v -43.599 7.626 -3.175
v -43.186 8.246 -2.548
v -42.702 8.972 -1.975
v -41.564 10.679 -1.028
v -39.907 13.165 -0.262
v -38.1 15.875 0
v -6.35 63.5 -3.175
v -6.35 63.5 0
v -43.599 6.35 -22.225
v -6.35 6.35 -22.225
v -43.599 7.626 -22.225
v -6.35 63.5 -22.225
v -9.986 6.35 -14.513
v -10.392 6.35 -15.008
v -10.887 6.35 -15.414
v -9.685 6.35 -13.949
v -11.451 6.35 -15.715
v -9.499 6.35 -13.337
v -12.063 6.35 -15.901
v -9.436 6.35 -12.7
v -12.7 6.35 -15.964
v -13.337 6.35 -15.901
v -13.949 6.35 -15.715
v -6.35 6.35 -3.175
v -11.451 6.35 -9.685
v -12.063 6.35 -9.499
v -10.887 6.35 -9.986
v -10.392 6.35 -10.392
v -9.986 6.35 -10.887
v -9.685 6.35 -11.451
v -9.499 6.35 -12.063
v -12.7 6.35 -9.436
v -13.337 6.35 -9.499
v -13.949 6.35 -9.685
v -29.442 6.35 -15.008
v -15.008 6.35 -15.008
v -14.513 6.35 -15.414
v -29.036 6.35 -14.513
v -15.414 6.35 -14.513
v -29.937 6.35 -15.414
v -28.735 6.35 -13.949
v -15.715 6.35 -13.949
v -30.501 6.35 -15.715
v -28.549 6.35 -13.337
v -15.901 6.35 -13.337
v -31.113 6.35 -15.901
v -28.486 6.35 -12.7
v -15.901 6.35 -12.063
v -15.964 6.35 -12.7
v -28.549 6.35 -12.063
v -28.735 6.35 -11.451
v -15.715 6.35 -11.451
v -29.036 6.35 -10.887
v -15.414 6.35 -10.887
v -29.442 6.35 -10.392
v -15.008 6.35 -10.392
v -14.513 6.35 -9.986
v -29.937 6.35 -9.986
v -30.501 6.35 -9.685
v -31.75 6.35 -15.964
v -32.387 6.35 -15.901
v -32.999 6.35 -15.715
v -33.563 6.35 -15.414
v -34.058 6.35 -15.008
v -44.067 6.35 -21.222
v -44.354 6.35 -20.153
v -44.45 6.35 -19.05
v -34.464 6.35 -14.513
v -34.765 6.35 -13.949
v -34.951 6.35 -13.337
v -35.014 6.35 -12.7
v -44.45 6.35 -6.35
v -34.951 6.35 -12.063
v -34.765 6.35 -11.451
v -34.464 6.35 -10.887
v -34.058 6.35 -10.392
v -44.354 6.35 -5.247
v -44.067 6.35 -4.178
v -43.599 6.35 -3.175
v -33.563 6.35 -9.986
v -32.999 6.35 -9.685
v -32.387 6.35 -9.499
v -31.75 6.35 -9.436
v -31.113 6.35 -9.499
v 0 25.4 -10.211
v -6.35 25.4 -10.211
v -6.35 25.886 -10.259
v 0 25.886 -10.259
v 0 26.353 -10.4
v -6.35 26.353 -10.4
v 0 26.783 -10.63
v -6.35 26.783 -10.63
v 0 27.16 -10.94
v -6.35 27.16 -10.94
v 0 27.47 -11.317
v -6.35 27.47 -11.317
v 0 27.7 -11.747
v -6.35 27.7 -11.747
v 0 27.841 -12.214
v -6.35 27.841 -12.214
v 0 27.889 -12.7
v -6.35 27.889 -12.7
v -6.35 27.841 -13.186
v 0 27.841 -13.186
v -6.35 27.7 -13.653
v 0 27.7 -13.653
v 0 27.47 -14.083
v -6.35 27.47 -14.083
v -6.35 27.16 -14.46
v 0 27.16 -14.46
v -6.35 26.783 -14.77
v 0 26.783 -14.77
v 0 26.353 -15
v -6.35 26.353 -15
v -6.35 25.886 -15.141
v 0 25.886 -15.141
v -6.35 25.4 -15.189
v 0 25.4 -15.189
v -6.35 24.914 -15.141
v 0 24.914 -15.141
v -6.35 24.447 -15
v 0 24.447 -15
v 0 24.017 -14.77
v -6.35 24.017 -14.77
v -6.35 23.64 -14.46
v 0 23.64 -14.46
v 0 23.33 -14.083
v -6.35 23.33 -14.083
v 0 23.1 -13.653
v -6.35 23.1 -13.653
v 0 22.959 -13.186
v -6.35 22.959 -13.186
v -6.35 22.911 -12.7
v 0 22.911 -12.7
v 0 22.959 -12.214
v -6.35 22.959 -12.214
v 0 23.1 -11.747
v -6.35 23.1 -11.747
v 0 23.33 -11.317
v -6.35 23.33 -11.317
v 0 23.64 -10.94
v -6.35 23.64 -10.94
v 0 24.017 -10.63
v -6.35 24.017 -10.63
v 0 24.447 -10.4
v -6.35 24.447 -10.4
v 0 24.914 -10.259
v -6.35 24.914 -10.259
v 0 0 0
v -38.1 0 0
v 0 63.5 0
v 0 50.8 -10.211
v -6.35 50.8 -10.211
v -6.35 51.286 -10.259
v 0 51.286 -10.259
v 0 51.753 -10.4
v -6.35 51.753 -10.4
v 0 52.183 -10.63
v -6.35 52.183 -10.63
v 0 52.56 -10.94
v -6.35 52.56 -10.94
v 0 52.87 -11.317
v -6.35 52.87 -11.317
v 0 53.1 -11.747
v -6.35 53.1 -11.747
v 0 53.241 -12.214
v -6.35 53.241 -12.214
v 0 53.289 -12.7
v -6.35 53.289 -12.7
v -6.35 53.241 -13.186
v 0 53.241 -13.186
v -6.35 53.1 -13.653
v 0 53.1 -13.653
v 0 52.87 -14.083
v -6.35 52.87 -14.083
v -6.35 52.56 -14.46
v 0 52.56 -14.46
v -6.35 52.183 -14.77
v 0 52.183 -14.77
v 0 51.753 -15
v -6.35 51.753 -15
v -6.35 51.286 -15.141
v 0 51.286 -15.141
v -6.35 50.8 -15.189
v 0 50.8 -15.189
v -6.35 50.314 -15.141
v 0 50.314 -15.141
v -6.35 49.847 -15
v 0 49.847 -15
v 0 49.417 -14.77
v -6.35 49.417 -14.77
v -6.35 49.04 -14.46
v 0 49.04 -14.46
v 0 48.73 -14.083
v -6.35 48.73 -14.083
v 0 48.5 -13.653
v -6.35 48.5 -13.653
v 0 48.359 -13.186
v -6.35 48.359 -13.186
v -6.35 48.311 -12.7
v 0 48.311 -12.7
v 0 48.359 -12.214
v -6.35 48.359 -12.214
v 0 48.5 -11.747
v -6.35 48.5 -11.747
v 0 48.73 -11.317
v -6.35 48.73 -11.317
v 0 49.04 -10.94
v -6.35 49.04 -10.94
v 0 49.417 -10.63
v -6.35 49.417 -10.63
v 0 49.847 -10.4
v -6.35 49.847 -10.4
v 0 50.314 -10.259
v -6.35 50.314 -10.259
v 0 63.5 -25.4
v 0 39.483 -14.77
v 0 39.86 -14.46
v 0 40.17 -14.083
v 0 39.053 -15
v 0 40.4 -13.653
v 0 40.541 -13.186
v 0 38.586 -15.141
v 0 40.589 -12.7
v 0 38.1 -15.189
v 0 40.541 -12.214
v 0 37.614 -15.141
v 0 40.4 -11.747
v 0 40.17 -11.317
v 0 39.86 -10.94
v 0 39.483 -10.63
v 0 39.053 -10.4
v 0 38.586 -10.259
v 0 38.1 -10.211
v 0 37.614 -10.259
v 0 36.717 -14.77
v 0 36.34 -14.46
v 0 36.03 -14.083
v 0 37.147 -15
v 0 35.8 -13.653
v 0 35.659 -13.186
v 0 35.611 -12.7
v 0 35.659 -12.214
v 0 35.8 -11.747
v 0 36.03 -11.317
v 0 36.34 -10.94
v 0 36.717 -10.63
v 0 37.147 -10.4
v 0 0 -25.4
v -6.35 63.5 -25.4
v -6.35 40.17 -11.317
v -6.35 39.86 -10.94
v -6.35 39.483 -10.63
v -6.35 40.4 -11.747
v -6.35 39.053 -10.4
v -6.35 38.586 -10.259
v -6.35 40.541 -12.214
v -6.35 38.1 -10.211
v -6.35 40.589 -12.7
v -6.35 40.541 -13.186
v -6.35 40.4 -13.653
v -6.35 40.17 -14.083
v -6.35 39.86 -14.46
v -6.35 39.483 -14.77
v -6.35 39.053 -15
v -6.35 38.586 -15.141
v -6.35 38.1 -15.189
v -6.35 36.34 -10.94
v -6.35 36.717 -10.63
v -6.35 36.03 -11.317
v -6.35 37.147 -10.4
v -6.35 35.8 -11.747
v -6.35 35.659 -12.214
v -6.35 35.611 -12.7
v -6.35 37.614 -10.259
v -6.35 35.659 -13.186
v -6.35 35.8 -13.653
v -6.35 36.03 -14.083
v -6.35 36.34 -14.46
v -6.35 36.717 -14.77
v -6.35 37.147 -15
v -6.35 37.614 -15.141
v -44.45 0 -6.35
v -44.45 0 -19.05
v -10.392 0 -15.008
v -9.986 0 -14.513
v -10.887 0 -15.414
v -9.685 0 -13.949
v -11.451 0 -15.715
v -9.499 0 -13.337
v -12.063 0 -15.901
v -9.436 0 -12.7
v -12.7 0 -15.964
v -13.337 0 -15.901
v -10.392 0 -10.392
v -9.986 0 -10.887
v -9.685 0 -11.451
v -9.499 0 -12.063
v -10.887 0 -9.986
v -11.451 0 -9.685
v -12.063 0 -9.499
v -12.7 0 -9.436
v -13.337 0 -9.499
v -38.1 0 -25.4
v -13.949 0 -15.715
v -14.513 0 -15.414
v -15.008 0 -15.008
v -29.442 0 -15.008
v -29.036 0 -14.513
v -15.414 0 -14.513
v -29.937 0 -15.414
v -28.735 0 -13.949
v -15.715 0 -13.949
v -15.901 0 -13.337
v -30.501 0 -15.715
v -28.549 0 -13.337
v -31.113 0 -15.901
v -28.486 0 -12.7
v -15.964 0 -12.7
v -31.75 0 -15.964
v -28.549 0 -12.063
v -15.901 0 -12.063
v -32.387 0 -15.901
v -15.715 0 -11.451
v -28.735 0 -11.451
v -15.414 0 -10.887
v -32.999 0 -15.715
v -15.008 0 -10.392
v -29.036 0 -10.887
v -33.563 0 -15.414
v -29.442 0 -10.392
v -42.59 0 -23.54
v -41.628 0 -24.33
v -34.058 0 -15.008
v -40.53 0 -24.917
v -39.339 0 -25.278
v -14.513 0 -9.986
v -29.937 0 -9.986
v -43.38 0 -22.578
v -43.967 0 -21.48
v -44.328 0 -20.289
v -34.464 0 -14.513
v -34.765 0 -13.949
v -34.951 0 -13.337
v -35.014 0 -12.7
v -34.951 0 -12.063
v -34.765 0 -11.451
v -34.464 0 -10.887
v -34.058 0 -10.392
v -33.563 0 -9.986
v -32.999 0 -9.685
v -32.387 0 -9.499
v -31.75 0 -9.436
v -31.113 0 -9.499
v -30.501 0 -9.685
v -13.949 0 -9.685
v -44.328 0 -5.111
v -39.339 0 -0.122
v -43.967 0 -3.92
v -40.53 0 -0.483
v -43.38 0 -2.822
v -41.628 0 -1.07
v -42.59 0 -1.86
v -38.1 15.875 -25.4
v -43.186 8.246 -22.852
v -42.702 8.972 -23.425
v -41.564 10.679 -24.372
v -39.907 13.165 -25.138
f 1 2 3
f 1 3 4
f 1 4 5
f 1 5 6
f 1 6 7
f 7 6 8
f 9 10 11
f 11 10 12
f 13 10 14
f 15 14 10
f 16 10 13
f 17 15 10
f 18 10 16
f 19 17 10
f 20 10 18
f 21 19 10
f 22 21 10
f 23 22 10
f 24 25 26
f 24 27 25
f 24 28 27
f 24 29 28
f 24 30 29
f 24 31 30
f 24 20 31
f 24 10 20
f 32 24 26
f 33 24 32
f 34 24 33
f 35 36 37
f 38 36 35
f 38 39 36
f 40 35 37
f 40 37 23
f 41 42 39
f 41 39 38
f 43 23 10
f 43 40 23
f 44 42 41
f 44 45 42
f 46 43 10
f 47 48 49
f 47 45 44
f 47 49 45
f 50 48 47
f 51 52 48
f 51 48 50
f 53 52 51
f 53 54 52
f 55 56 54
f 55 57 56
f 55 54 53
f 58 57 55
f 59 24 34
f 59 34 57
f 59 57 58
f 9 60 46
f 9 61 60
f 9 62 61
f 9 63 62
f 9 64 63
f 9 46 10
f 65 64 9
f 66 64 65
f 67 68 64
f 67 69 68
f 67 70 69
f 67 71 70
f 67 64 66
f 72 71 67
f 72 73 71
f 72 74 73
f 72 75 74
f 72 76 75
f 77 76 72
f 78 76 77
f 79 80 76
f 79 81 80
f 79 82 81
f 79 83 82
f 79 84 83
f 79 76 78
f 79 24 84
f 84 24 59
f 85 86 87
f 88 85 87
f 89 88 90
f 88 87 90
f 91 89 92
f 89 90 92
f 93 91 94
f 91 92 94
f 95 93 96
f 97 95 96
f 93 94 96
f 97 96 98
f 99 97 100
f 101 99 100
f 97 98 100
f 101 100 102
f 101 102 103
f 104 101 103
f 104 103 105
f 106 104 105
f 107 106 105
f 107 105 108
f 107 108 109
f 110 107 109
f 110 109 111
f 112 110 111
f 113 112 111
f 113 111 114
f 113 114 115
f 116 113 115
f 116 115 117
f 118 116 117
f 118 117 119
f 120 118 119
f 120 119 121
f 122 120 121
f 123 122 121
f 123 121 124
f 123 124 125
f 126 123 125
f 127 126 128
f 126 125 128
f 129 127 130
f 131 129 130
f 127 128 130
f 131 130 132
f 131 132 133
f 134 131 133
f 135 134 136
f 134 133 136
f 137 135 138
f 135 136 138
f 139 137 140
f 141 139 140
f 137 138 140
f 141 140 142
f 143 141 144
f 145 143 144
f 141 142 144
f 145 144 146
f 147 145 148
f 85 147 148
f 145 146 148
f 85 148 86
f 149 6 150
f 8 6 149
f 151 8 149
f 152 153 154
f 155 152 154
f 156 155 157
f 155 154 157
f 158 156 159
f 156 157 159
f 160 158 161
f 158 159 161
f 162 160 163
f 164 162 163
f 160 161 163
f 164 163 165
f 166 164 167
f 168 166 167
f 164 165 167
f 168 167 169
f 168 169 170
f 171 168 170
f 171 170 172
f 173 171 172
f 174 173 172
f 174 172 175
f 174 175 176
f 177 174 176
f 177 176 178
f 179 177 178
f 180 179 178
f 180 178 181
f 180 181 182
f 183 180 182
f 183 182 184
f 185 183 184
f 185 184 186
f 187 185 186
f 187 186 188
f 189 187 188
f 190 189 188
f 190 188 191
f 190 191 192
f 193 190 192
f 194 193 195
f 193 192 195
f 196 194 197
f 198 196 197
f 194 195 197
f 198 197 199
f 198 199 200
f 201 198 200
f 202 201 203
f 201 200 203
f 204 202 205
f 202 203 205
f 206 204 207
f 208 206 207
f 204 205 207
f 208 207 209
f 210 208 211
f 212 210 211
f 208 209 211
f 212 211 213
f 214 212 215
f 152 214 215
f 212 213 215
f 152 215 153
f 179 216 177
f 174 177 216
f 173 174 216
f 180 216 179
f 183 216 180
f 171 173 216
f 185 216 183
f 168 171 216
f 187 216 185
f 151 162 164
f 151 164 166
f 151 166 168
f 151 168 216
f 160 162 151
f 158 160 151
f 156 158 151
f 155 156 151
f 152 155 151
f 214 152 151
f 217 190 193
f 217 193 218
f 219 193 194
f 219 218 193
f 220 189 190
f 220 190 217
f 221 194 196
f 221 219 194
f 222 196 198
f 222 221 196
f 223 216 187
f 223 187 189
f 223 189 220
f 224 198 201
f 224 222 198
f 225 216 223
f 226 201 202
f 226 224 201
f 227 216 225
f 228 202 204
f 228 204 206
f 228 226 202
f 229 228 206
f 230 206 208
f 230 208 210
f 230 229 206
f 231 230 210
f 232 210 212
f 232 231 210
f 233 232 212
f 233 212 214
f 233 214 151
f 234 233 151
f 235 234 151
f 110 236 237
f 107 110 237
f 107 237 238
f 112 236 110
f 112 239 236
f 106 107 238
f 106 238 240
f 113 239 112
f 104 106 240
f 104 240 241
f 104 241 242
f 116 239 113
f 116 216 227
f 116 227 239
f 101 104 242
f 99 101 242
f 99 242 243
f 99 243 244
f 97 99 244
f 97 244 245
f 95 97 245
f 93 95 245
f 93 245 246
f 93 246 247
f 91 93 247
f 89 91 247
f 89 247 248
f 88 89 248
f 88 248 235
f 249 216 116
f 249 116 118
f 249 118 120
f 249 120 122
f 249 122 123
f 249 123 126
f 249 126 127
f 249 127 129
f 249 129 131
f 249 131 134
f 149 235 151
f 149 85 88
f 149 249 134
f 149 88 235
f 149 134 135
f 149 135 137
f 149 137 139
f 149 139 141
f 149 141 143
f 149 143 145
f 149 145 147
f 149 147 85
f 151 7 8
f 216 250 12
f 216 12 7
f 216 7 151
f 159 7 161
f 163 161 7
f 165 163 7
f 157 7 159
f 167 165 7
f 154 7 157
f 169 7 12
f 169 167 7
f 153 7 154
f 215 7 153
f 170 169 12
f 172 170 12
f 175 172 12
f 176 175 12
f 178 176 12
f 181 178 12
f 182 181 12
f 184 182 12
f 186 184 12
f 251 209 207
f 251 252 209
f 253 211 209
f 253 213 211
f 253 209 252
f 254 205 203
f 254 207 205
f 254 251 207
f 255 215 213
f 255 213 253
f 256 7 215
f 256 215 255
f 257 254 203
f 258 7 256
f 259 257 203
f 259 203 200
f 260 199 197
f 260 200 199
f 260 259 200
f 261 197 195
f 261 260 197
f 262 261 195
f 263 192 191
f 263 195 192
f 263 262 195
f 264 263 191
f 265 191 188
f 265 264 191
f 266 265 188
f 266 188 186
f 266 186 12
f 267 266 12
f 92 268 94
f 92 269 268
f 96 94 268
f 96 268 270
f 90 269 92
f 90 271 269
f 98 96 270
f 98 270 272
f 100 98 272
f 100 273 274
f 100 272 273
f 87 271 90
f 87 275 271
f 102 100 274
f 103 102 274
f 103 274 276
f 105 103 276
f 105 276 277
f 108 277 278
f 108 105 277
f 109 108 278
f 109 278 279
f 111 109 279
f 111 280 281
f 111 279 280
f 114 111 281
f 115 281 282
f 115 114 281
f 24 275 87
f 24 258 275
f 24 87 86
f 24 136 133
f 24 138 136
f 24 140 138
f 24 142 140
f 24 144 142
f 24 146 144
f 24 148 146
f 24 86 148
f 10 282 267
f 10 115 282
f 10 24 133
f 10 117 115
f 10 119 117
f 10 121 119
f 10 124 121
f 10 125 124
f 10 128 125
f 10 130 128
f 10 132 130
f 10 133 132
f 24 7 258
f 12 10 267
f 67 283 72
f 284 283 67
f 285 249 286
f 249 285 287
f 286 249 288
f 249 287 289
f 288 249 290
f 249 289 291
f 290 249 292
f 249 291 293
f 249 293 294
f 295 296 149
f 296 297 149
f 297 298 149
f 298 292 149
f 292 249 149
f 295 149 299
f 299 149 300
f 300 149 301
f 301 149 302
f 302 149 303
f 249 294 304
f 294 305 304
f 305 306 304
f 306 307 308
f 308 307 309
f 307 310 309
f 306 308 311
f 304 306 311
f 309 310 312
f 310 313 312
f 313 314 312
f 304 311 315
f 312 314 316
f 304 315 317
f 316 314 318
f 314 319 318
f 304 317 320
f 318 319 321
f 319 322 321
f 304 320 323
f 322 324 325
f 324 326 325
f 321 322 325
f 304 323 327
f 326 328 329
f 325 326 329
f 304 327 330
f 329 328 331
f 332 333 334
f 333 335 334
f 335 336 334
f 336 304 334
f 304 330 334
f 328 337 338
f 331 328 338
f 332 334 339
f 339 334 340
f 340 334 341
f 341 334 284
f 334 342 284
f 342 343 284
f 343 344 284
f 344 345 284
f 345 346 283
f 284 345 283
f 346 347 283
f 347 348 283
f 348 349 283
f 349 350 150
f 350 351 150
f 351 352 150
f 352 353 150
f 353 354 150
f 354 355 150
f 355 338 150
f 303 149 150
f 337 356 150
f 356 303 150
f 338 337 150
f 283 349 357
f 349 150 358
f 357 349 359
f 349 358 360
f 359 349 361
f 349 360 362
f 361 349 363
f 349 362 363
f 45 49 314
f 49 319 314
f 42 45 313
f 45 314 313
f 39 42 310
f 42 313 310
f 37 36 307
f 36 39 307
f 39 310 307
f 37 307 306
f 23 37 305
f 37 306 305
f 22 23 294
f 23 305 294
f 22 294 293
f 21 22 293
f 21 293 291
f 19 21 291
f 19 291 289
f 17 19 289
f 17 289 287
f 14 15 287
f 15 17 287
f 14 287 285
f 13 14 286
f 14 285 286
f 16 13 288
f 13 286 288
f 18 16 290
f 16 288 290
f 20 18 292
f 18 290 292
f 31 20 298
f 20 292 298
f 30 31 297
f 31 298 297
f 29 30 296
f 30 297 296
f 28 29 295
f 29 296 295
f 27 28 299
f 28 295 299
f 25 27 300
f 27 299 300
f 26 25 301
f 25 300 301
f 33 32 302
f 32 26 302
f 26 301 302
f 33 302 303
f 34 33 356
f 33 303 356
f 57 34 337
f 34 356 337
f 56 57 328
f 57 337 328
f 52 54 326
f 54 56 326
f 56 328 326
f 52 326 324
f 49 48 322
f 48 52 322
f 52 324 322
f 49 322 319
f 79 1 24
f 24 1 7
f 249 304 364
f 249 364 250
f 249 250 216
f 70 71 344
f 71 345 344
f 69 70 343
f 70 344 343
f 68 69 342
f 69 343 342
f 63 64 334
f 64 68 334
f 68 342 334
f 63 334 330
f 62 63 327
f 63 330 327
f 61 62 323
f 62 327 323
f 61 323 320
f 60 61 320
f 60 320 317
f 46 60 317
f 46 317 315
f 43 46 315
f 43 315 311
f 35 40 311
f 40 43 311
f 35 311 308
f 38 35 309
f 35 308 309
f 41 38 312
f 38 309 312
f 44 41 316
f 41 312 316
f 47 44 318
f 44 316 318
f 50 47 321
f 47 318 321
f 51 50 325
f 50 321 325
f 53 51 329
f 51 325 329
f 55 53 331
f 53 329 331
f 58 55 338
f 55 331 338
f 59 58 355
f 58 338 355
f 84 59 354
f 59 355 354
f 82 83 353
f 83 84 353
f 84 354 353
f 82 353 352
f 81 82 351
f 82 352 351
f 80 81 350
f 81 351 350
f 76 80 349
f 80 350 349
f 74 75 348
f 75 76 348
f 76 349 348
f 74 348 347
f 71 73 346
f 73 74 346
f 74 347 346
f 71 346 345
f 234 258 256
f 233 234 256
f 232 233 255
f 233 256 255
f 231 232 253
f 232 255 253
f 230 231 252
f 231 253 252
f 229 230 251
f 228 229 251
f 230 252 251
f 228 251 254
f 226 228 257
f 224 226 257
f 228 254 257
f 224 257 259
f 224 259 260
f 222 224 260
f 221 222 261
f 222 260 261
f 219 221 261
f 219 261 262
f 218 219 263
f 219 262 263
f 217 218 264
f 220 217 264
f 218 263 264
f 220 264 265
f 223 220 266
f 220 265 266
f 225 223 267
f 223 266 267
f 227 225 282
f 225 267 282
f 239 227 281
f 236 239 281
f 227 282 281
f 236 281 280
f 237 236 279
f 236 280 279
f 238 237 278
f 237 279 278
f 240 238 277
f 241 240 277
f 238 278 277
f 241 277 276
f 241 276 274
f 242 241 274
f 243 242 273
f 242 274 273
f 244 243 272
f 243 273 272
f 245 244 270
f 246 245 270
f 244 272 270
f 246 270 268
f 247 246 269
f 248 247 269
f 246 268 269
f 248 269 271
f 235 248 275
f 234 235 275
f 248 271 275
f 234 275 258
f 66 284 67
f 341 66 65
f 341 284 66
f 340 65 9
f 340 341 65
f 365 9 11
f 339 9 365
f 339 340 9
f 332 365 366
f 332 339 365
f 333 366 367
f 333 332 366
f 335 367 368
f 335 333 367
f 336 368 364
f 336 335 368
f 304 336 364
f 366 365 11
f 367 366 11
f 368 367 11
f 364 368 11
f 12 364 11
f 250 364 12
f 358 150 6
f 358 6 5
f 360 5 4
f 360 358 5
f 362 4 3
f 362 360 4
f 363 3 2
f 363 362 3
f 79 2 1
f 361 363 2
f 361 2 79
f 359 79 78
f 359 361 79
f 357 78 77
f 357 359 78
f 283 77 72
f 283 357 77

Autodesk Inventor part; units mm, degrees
ref_plane "YZ Plane" through (0, 0, 0) normal (1, 0, 0) x (0, 1, 0)
ref_plane "XZ Plane" through (0, 0, 0) normal (0, 1, 0) x (-1, 0, 0)
ref_plane "XY Plane" through (0, 0, 0) normal (0, 0, 1) x (1, 0, 0)
sketch "Sketch1" plane through (0, 0, 0) normal (0, 1, 0) x (-1, 0, 0)
  line L0 (0, 0) -> (44.45, 0)
  line L1 (44.45, 0) -> (44.45, -25.4)
  line L2 (44.45, -25.4) -> (0, -25.4)
  line L3 (0, -25.4) -> (0, 0)
  circle A0 centre (12.7, -12.7) radius 3.2639
  circle A1 centre (31.75, -12.7) radius 3.2639
  point P0 (0, -12.7)
  dimension "d0" = 44.45
  dimension "d1" = 25.4
  dimension "d2" = 6.5278
  dimension "d3" = 19.05
  dimension "d4" = 12.7
  dimension "d5" = 12.7
extrude "Extrusion1" add sketch "Sketch1" along normal blind 6.35
sketch "Sketch2" plane through (0, 6.35, 0) normal (0, 1, 0) x (1, 0, 0)
  line L0 (0, 25.4) -> (-44.45, 25.4) projected
  line L1 (0, 0) -> (-6.35, 0)
  line L2 (-6.35, 0) -> (-6.35, 25.4)
  line L3 (-6.35, 25.4) -> (0, 25.4)
  line L4 (0, 25.4) -> (0, 0)
  dimension "d8" = 6.35
extrude "Extrusion2" add sketch "Sketch2" along normal blind 57.15
sketch "Sketch3" plane through (-6.35, 6.35, -25.4) normal (-1, 0, 0) x (0, 0, 1)
  circle A0 centre (12.7, 19.05) radius 2.4892
  circle A1 centre (12.7, 44.45) radius 2.4892
  line L0 (0, 0) -> (25.4, 0) projected
  line L1 (25.4, 0) -> (25.4, 57.15) projected
  circle A2 centre (12.7, 31.75) radius 2.4892
  point P0 (25.4, -6.35)
  dimension "d11" = 4.9784
  dimension "d12" = 4.9784
  dimension "d13" = 25.4
  dimension "d14" = 19.05
  dimension "d15" = 12.7
  dimension "d23" = 12.7
extrude "Extrusion3" cut sketch "Sketch3" against normal through all
sketch "Sketch4" plane through (-44.45, 0, 0) normal (0, 0, 1) x (1, 0, 0)
  line L0 (0, 6.35) -> (38.1, 6.35) projected
  line L1 (0, 0) -> (44.45, 0) projected
  line L2 (44.45, 0) -> (44.45, 63.5) projected
  line L3 (38.1, 63.5) -> (44.45, 63.5) projected
  line L4 (38.1, 6.35) -> (38.1, 63.5) projected
  line L5 (0, 6.35) -> (38.1, 6.35) projected
  line L6 (0, 0) -> (0, 6.35) projected
  line L7 (0, 6.35) -> (38.1, 63.5)
  line L8 (44.45, 63.5) -> (44.45, 0)
  line L9 (0, 0) -> (0, 6.35)
  line L10 (44.45, 0) -> (0, 0)
  line L11 (38.1, 63.5) -> (44.45, 63.5)
extrude "Extrusion4" add sketch "Sketch4" against normal blind 3.175 contours L7 L4 L0
sketch "Sketch5" plane through (0, 0, -25.4) normal (0, 0, -1) x (-1, 0, 0)
  line L0 (0, 0) -> (44.45, 0) projected
  line L1 (44.45, 0) -> (44.45, 6.35) projected
  line L2 (6.35, 6.35) -> (44.45, 6.35) projected
  line L3 (6.35, 6.35) -> (6.35, 63.5) projected
  line L4 (0, 63.5) -> (6.35, 63.5) projected
  line L5 (0, 0) -> (0, 63.5) projected
  line L6 (44.45, 6.35) -> (44.45, 0)
  line L7 (0, 0) -> (44.45, 0)
  line L8 (44.45, 6.35) -> (6.35, 63.5)
  line L9 (0, 0) -> (0, 63.5) projected
  line L10 (6.35, 63.5) -> (0, 63.5)
  line L11 (0, 63.5) -> (0, 0)
extrude "Extrusion5" add sketch "Sketch5" against normal blind 3.175
fillet "Fillet1" radius 6.35 2 edges at (-44.45, 3.175, -25.4) (-44.45, 3.175, 0)
properties part number "INDX_025_backshuffleBracket" material "ABS Plastic"
